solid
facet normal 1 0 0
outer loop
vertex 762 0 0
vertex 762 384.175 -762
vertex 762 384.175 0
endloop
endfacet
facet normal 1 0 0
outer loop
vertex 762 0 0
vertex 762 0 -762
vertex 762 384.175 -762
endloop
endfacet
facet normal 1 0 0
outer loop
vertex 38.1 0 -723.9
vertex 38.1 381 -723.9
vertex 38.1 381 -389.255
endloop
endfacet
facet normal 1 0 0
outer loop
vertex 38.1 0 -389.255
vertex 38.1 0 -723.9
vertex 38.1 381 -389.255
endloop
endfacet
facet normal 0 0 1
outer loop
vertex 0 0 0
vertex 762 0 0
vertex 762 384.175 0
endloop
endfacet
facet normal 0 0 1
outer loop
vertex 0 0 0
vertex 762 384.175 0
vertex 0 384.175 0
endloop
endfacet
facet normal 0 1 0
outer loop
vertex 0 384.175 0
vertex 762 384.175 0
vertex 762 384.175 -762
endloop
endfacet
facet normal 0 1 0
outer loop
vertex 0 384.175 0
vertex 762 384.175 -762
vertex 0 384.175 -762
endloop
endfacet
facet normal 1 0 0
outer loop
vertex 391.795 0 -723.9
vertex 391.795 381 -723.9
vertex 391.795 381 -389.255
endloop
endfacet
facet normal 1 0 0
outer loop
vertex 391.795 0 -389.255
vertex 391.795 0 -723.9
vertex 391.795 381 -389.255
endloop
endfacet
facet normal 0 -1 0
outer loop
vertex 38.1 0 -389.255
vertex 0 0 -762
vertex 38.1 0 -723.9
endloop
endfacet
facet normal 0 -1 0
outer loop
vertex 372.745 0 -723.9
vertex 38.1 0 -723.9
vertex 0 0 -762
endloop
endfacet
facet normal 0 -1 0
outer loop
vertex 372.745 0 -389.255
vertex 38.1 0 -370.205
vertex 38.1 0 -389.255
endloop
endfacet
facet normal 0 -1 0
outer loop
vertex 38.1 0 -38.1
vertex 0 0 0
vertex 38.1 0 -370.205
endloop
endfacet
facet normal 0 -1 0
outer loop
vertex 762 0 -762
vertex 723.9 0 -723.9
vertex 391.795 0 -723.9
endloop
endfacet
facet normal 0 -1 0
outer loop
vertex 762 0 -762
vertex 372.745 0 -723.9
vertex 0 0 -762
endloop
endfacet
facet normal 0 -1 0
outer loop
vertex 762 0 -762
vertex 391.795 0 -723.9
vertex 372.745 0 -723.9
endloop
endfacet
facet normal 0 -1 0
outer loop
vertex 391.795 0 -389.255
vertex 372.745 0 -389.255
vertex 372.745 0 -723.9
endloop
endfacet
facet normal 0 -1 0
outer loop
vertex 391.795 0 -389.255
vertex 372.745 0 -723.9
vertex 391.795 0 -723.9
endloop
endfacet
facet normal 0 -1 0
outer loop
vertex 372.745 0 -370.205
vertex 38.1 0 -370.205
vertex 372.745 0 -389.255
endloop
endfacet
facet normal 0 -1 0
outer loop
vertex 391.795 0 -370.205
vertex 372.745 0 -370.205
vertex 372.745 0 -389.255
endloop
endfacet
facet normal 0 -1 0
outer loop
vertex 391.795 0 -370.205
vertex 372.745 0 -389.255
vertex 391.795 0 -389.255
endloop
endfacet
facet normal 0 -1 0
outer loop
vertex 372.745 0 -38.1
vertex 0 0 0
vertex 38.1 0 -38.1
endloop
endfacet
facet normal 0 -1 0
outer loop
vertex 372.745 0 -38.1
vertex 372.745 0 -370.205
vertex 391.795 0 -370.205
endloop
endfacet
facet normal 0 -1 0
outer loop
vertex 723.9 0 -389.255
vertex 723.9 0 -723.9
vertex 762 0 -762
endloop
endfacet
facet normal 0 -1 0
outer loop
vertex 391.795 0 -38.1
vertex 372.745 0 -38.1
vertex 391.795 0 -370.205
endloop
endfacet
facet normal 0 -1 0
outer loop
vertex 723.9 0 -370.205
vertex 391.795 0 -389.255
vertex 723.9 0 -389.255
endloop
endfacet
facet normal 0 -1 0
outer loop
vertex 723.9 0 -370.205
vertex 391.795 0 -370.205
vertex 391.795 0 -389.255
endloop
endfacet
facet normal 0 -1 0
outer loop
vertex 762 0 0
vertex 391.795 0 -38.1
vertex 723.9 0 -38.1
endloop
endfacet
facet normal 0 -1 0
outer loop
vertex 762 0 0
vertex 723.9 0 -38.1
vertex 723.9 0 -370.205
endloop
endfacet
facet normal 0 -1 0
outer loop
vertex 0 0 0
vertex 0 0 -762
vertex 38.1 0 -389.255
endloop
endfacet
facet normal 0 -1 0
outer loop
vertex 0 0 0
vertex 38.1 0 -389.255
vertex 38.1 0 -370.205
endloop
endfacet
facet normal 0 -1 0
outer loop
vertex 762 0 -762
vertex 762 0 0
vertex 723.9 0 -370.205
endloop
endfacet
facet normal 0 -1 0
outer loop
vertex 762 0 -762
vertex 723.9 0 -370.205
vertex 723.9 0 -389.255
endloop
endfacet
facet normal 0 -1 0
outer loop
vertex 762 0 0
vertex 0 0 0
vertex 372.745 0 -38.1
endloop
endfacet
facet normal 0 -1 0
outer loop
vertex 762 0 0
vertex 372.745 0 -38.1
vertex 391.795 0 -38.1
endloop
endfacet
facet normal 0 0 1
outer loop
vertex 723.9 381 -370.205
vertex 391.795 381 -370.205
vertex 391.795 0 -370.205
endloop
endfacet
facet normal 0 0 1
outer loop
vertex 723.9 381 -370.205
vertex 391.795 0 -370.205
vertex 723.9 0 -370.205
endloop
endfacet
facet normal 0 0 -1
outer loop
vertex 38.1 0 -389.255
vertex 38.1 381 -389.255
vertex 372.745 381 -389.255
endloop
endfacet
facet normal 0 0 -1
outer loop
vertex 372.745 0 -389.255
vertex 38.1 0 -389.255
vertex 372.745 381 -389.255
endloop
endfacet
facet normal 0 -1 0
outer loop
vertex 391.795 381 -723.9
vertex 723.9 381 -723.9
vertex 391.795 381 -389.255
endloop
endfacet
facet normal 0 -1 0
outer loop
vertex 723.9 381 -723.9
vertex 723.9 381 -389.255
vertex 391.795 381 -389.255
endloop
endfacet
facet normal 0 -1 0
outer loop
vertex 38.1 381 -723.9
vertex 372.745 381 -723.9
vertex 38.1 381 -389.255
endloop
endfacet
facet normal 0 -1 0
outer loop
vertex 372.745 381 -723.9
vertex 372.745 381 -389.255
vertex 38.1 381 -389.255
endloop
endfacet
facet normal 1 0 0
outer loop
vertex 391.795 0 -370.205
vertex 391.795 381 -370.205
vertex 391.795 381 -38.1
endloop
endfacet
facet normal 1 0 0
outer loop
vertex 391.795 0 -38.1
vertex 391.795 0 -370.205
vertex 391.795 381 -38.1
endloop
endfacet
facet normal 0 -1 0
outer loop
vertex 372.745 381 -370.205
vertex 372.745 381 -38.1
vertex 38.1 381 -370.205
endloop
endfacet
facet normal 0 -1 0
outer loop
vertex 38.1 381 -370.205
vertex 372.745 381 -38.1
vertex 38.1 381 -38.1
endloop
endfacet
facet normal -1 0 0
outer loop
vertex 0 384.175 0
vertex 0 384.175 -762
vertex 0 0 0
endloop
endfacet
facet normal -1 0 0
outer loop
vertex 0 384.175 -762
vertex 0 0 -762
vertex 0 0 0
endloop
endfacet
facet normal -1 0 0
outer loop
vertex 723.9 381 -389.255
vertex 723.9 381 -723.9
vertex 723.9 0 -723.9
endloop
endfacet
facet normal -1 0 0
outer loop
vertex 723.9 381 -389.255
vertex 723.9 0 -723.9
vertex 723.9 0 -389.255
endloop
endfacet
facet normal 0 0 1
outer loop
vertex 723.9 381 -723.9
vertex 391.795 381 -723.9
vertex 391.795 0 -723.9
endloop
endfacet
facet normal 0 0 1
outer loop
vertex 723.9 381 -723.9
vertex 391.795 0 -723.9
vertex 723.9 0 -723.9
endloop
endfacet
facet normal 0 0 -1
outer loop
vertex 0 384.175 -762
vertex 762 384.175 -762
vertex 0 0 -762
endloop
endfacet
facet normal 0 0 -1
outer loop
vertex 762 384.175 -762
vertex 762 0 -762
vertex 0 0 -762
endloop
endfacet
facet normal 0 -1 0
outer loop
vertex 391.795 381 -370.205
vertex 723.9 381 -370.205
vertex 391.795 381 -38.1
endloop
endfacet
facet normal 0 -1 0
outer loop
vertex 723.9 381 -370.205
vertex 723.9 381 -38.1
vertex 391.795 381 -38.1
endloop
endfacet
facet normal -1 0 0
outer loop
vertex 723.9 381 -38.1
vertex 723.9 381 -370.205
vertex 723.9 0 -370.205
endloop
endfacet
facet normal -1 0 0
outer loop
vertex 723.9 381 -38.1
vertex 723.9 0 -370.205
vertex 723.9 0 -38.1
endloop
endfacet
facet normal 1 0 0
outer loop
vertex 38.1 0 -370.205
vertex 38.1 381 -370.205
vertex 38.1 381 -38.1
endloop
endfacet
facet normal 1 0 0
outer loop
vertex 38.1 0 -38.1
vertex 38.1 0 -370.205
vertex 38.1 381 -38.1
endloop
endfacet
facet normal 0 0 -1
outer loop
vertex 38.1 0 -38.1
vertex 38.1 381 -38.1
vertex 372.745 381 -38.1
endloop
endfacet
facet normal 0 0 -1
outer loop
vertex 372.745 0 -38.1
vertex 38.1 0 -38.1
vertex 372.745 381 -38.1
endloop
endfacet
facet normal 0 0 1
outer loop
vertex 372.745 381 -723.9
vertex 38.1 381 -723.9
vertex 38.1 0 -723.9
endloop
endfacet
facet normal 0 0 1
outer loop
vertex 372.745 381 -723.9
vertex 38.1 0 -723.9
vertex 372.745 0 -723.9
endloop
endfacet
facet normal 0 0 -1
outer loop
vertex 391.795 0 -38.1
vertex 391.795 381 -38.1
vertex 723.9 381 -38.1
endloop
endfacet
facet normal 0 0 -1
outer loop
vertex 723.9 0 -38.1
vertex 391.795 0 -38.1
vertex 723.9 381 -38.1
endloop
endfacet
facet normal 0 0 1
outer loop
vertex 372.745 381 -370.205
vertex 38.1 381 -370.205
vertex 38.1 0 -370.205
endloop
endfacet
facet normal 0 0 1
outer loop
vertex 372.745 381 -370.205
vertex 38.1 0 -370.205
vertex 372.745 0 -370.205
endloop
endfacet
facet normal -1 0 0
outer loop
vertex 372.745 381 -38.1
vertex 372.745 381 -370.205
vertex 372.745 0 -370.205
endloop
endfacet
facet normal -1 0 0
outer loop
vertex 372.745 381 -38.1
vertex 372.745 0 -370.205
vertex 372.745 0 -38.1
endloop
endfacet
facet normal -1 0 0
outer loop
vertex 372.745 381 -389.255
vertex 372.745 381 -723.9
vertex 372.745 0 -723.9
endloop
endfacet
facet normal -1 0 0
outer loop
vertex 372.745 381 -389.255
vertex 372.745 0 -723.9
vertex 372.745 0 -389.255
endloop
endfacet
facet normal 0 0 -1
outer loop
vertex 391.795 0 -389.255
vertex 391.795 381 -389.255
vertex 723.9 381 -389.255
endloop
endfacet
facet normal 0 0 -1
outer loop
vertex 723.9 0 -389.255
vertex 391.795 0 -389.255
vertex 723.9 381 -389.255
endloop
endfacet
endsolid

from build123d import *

# Parameters (mm, degrees)
F0_W     = 762
F0_H     = 762
F0_W_2   = 334.645
F0_H_2   = 334.645
F0_W_3   = 332.105
F0_H_3   = 332.105
F1_DEPTH = 381
F2_W     = 762
F2_H     = 762
F3_DEPTH = 3.175


with BuildPart() as f1:
    # F0 (on Front) → F1 (new body)
    with BuildSketch(Plane.XZ):
        with Locations((381, -381)):
            Rectangle(F0_W, F0_H)
        with Locations((205.4225, -556.5775)):
            Rectangle(F0_W_2, F0_H_2, mode=Mode.SUBTRACT)
        with Locations((557.8475, -556.5775)):
            Rectangle(F0_W_3, F0_H_2, mode=Mode.SUBTRACT)
        with Locations((205.4225, -204.1525)):
            Rectangle(F0_W_2, F0_H_3, mode=Mode.SUBTRACT)
        with Locations((557.8475, -204.1525)):
            Rectangle(F0_W_3, F0_H_3, mode=Mode.SUBTRACT)
    extrude(amount=-F1_DEPTH)

    # F2 (on face) → F3 (join)
    with BuildSketch(Plane(origin=(0, 381, 0), x_dir=(-1, 0, 0), z_dir=(0, 1, 0))):
        with Locations((-381, -381)):
            Rectangle(F2_W, F2_H)
    extrude(amount=F3_DEPTH)


solid = f1.part
